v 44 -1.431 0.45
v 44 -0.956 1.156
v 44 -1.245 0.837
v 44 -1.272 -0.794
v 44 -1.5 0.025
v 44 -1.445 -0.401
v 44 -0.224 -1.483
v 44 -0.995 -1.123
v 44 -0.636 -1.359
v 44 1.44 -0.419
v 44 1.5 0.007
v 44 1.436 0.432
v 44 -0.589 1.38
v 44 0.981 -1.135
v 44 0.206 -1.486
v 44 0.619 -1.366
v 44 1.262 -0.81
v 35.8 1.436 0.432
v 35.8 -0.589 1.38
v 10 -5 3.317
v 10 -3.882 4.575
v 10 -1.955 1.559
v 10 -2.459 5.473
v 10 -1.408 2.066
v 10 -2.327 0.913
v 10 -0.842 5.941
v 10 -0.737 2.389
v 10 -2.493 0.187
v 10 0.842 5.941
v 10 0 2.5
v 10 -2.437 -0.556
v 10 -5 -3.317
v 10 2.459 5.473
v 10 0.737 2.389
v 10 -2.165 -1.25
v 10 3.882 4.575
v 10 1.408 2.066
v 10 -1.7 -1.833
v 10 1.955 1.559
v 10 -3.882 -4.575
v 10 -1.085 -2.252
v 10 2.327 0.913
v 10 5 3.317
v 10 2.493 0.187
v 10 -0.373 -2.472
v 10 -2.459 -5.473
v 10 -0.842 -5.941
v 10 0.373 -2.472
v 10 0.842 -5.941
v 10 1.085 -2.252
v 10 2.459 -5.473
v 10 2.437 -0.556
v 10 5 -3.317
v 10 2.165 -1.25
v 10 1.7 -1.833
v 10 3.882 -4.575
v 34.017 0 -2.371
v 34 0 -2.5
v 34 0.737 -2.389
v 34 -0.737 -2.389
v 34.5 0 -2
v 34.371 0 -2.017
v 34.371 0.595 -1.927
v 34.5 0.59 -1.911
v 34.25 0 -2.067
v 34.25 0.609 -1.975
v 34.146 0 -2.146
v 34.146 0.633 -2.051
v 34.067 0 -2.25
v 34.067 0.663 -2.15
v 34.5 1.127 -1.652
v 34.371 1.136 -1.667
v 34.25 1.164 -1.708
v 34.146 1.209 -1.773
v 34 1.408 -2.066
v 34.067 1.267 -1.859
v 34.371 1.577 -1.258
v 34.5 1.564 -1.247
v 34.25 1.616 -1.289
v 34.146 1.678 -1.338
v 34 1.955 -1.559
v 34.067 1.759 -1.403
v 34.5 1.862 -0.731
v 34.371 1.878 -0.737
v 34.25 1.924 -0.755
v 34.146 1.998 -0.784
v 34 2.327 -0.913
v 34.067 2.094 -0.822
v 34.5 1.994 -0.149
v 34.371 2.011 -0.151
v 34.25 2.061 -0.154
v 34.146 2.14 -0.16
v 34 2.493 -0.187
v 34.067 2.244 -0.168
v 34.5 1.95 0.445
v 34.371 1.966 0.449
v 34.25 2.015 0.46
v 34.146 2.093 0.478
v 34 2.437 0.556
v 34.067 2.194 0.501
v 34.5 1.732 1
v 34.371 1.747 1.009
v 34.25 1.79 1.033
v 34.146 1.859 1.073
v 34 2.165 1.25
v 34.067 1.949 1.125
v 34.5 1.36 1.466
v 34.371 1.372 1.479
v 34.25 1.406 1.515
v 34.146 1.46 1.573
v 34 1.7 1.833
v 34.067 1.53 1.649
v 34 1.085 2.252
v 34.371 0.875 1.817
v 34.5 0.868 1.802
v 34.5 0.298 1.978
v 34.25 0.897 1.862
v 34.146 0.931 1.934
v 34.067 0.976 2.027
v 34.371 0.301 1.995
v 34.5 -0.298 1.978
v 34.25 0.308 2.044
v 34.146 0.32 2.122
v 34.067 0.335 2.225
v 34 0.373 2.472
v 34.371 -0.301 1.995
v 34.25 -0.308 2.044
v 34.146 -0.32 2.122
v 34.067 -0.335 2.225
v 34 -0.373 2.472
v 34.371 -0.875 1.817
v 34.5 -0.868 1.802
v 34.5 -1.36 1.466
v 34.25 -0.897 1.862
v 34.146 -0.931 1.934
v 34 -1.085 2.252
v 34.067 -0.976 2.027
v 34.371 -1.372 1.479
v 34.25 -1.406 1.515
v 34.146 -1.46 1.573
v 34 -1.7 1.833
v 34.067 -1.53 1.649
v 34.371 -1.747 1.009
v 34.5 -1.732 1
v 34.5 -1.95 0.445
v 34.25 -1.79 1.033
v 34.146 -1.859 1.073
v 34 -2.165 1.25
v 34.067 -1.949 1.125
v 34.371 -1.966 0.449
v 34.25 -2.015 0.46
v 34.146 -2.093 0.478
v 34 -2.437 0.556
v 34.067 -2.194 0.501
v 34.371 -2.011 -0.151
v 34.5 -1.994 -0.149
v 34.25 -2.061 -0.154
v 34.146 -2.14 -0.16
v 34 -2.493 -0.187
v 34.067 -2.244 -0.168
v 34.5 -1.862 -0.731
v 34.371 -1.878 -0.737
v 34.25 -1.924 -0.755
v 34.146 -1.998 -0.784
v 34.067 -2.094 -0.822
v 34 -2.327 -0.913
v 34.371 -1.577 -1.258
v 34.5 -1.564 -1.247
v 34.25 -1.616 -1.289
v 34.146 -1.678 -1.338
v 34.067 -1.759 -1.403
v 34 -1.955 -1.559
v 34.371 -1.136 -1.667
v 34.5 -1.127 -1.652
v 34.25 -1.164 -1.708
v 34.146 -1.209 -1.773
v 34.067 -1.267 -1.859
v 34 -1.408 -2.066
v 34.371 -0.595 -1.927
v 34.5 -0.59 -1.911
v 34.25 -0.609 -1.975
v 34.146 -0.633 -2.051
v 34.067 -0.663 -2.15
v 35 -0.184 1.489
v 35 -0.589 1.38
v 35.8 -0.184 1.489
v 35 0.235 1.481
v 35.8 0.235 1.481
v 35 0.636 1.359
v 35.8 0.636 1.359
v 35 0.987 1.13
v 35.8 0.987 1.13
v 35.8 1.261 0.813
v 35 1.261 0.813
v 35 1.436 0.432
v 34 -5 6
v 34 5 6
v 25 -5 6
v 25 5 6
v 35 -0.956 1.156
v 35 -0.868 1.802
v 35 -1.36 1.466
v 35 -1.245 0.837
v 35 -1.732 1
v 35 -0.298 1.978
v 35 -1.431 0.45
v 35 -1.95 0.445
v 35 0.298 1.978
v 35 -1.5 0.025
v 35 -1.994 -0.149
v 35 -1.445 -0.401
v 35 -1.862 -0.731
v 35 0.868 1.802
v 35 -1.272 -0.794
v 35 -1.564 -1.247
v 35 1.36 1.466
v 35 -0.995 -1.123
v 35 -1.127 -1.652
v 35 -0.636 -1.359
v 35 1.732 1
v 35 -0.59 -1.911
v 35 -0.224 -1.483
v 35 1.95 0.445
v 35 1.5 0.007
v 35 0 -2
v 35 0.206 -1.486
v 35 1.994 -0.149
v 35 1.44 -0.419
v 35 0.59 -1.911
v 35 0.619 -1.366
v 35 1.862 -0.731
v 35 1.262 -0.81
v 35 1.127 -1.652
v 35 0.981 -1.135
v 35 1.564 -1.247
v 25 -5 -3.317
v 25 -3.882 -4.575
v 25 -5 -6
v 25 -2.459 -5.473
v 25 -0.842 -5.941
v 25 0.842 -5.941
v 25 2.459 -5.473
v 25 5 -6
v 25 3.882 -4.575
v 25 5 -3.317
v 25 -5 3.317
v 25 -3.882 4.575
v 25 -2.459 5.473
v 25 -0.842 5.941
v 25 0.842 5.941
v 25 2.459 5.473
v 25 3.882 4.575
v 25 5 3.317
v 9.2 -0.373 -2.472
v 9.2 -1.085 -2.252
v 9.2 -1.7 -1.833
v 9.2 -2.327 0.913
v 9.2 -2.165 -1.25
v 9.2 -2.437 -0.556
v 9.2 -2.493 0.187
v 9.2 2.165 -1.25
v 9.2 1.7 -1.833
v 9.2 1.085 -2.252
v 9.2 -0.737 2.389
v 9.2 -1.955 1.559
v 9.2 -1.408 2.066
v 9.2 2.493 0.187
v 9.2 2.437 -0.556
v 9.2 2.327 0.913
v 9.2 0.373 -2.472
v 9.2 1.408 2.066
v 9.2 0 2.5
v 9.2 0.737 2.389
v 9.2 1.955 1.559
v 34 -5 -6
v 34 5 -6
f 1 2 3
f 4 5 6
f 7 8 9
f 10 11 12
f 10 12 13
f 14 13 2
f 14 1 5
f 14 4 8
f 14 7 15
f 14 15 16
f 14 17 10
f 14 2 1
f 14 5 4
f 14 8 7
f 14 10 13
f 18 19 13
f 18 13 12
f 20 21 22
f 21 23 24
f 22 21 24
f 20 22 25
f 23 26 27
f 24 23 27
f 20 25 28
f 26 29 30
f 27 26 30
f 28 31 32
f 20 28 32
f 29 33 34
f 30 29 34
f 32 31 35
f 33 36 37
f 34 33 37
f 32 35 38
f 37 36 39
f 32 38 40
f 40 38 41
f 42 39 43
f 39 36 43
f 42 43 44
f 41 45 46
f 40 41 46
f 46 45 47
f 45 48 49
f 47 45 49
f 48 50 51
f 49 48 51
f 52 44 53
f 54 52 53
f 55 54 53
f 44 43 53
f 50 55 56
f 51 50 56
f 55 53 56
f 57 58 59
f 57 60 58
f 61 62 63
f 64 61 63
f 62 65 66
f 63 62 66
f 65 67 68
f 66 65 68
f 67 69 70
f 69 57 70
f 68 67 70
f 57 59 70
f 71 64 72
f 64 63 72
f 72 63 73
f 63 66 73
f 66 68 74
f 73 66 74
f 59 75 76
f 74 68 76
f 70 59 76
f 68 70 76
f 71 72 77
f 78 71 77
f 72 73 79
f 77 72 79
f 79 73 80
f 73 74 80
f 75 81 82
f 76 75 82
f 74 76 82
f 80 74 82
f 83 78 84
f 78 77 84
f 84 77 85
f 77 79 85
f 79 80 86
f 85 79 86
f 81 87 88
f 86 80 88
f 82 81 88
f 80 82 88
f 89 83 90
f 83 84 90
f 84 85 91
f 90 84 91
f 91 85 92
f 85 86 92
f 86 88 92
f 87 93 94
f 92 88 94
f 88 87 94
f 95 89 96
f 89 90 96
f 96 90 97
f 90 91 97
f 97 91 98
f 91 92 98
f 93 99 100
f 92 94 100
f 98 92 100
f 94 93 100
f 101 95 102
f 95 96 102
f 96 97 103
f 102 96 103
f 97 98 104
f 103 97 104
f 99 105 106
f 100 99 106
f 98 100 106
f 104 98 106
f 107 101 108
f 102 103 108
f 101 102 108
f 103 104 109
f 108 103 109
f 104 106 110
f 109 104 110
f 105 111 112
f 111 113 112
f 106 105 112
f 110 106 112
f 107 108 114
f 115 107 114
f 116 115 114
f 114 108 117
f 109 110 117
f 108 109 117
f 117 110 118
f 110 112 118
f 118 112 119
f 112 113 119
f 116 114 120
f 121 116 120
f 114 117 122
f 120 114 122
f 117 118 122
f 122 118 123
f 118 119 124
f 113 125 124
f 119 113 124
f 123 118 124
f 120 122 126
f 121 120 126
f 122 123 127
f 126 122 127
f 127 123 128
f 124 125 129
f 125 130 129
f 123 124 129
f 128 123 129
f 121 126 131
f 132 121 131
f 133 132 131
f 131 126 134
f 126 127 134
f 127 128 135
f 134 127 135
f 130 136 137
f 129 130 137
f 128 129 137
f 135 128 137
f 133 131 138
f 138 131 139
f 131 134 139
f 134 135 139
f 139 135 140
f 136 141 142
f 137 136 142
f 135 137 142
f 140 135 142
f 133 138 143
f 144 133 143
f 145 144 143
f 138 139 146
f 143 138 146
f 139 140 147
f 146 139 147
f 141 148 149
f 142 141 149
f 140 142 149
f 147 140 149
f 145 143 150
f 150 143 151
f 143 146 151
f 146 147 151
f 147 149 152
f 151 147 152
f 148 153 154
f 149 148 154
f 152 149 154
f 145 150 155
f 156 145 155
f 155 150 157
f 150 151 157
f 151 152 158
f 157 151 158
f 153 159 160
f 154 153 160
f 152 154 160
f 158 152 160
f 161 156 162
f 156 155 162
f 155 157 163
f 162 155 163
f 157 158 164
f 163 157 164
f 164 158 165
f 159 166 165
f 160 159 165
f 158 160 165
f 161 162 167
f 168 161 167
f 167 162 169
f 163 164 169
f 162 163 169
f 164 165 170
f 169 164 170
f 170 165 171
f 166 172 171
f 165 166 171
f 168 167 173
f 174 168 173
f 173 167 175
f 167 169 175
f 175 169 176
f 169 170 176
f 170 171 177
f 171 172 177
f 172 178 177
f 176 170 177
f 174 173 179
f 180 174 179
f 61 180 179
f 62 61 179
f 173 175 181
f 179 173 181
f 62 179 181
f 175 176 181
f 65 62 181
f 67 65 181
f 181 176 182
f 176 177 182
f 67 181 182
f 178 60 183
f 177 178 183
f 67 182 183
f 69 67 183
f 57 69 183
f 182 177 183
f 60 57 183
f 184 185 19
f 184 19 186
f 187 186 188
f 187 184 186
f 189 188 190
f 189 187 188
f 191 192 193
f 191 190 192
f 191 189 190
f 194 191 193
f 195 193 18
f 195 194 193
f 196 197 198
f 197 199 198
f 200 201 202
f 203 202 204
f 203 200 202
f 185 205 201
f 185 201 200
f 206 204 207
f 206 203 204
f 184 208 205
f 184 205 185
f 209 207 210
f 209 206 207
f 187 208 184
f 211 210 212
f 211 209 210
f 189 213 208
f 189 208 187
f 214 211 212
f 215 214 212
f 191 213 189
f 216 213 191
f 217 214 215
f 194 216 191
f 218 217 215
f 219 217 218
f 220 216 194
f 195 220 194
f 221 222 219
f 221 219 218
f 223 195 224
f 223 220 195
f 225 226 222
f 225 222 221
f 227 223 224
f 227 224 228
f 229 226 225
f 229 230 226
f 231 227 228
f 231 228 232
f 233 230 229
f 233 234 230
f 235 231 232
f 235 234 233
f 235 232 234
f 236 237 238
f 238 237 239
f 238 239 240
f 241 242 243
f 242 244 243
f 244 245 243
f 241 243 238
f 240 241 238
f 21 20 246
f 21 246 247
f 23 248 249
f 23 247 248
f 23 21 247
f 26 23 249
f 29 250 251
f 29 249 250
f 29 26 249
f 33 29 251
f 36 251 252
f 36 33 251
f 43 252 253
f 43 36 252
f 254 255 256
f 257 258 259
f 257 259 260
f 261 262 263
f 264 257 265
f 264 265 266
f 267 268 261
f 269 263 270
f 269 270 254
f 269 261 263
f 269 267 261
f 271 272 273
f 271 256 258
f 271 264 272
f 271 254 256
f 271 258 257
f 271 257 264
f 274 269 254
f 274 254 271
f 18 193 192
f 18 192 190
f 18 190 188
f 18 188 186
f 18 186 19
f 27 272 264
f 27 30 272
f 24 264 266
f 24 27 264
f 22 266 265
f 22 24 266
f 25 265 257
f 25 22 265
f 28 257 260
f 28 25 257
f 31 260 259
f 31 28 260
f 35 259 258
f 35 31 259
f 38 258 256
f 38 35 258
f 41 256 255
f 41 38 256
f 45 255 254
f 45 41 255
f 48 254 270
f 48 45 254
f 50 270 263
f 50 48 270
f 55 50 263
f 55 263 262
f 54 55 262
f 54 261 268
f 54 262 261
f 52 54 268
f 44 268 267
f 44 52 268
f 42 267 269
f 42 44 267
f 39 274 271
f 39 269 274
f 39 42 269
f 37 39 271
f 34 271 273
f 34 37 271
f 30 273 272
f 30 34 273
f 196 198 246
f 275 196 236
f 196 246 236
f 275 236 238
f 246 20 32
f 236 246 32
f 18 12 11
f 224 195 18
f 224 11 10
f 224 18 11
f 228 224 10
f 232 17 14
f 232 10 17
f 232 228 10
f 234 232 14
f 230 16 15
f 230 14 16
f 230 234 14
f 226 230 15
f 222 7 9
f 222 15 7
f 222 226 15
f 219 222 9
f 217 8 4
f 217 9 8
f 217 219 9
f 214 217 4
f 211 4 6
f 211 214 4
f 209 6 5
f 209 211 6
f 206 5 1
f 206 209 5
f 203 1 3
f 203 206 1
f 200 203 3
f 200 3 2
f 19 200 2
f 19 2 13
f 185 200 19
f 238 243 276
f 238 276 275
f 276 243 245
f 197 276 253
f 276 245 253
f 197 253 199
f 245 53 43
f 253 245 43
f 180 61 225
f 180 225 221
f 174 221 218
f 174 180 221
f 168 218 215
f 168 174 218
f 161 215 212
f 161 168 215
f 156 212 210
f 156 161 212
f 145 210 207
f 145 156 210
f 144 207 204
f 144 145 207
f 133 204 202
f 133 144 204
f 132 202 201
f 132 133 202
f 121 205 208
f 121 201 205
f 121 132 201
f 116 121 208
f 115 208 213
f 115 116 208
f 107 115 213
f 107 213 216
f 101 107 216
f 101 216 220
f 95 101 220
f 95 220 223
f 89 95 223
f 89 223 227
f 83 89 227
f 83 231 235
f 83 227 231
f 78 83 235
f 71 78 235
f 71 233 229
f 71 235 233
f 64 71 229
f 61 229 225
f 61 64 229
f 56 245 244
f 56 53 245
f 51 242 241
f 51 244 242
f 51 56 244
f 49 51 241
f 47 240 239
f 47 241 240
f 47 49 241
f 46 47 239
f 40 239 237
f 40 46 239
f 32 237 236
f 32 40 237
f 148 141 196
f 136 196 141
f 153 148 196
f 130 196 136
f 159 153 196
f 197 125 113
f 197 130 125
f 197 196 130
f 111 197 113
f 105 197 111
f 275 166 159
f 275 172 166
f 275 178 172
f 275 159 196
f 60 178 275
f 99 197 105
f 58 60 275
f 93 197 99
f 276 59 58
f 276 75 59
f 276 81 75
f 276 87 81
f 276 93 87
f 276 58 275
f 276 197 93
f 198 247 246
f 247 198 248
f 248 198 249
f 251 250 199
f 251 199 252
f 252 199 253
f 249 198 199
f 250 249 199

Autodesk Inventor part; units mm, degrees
ref_plane "YZ Plane" through (0, 0, 0) normal (1, 0, 0) x (0, 1, 0)
ref_plane "XZ Plane" through (0, 0, 0) normal (0, 1, 0) x (-1, 0, 0)
ref_plane "Pracovní rovina2" through (10, 0, 0) normal (1, 0, 0) x (0, 0, -1)
sketch "Náčrt1" plane through (10, 0, 0) normal (1, 0, 0) x (0, 0, -1)
  arc A0 (-3.3166, 5) -> (-3.3166, -5) centre (0, 0) ccw projected
  line L0 (3.3166, 5) -> (-3.3166, 5) projected
  arc A1 (3.3166, -5) -> (3.3166, 5) centre (0, 0) ccw projected
  line L1 (-3.3166, -5) -> (3.3166, -5) projected
  point P0 (0, 0)
extrude "Vysunutí1" add sketch "Náčrt1" along normal blind 15
sketch "Náčrt2" plane through (25, 0, 0) normal (1, 0, 0) x (0, 0, -1)
  line L0 (-6, 5) -> (-6, -5) projected
  line L1 (6, 5) -> (-6, 5) projected
  line L2 (6, 5) -> (6, -5) projected
  line L3 (-6, -5) -> (6, -5) projected
  point P0 (0, 0)
extrude "Vysunutí2" add sketch "Náčrt2" along normal blind 9
sketch "Náčrt3" plane through (34, 0, 0) normal (1, 0, 0) x (0, 0, -1)
  arc A0 (-1.3795, -0.589) -> (-0.4321, 1.4364) centre (0, 0) ccw projected
  line L0 (-1.3795, -0.589) -> (-0.4321, 1.4364) projected
  circle A1 centre (0, 0) radius 2 projected
  arc A2 (-0.4321, 1.4364) -> (-1.3795, -0.589) centre (0, 0) ccw projected
extrude "Vysunutí3" add sketch "Náčrt3" along normal blind 1
extrude "Vysunutí4" add sketch "Náčrt3" along normal blind 10 contours L0 A0
extrude "Vysunutí5" add sketch "Náčrt3" along normal blind 1.8 contours A2 L0
sketch "Náčrt4" plane through (10, 0, 0) normal (-1, 0, 0) x (0, 0, 1)
  circle A0 centre (0, 0) radius 2.5
  dimension "d12" = 5
extrude "Vysunutí6" add sketch "Náčrt4" along normal blind 0.8
fillet "Zaoblení2" radius 0.5 1 edges at (34, 0, 2)
properties part number "GA12-N20 Motor_finalV"
